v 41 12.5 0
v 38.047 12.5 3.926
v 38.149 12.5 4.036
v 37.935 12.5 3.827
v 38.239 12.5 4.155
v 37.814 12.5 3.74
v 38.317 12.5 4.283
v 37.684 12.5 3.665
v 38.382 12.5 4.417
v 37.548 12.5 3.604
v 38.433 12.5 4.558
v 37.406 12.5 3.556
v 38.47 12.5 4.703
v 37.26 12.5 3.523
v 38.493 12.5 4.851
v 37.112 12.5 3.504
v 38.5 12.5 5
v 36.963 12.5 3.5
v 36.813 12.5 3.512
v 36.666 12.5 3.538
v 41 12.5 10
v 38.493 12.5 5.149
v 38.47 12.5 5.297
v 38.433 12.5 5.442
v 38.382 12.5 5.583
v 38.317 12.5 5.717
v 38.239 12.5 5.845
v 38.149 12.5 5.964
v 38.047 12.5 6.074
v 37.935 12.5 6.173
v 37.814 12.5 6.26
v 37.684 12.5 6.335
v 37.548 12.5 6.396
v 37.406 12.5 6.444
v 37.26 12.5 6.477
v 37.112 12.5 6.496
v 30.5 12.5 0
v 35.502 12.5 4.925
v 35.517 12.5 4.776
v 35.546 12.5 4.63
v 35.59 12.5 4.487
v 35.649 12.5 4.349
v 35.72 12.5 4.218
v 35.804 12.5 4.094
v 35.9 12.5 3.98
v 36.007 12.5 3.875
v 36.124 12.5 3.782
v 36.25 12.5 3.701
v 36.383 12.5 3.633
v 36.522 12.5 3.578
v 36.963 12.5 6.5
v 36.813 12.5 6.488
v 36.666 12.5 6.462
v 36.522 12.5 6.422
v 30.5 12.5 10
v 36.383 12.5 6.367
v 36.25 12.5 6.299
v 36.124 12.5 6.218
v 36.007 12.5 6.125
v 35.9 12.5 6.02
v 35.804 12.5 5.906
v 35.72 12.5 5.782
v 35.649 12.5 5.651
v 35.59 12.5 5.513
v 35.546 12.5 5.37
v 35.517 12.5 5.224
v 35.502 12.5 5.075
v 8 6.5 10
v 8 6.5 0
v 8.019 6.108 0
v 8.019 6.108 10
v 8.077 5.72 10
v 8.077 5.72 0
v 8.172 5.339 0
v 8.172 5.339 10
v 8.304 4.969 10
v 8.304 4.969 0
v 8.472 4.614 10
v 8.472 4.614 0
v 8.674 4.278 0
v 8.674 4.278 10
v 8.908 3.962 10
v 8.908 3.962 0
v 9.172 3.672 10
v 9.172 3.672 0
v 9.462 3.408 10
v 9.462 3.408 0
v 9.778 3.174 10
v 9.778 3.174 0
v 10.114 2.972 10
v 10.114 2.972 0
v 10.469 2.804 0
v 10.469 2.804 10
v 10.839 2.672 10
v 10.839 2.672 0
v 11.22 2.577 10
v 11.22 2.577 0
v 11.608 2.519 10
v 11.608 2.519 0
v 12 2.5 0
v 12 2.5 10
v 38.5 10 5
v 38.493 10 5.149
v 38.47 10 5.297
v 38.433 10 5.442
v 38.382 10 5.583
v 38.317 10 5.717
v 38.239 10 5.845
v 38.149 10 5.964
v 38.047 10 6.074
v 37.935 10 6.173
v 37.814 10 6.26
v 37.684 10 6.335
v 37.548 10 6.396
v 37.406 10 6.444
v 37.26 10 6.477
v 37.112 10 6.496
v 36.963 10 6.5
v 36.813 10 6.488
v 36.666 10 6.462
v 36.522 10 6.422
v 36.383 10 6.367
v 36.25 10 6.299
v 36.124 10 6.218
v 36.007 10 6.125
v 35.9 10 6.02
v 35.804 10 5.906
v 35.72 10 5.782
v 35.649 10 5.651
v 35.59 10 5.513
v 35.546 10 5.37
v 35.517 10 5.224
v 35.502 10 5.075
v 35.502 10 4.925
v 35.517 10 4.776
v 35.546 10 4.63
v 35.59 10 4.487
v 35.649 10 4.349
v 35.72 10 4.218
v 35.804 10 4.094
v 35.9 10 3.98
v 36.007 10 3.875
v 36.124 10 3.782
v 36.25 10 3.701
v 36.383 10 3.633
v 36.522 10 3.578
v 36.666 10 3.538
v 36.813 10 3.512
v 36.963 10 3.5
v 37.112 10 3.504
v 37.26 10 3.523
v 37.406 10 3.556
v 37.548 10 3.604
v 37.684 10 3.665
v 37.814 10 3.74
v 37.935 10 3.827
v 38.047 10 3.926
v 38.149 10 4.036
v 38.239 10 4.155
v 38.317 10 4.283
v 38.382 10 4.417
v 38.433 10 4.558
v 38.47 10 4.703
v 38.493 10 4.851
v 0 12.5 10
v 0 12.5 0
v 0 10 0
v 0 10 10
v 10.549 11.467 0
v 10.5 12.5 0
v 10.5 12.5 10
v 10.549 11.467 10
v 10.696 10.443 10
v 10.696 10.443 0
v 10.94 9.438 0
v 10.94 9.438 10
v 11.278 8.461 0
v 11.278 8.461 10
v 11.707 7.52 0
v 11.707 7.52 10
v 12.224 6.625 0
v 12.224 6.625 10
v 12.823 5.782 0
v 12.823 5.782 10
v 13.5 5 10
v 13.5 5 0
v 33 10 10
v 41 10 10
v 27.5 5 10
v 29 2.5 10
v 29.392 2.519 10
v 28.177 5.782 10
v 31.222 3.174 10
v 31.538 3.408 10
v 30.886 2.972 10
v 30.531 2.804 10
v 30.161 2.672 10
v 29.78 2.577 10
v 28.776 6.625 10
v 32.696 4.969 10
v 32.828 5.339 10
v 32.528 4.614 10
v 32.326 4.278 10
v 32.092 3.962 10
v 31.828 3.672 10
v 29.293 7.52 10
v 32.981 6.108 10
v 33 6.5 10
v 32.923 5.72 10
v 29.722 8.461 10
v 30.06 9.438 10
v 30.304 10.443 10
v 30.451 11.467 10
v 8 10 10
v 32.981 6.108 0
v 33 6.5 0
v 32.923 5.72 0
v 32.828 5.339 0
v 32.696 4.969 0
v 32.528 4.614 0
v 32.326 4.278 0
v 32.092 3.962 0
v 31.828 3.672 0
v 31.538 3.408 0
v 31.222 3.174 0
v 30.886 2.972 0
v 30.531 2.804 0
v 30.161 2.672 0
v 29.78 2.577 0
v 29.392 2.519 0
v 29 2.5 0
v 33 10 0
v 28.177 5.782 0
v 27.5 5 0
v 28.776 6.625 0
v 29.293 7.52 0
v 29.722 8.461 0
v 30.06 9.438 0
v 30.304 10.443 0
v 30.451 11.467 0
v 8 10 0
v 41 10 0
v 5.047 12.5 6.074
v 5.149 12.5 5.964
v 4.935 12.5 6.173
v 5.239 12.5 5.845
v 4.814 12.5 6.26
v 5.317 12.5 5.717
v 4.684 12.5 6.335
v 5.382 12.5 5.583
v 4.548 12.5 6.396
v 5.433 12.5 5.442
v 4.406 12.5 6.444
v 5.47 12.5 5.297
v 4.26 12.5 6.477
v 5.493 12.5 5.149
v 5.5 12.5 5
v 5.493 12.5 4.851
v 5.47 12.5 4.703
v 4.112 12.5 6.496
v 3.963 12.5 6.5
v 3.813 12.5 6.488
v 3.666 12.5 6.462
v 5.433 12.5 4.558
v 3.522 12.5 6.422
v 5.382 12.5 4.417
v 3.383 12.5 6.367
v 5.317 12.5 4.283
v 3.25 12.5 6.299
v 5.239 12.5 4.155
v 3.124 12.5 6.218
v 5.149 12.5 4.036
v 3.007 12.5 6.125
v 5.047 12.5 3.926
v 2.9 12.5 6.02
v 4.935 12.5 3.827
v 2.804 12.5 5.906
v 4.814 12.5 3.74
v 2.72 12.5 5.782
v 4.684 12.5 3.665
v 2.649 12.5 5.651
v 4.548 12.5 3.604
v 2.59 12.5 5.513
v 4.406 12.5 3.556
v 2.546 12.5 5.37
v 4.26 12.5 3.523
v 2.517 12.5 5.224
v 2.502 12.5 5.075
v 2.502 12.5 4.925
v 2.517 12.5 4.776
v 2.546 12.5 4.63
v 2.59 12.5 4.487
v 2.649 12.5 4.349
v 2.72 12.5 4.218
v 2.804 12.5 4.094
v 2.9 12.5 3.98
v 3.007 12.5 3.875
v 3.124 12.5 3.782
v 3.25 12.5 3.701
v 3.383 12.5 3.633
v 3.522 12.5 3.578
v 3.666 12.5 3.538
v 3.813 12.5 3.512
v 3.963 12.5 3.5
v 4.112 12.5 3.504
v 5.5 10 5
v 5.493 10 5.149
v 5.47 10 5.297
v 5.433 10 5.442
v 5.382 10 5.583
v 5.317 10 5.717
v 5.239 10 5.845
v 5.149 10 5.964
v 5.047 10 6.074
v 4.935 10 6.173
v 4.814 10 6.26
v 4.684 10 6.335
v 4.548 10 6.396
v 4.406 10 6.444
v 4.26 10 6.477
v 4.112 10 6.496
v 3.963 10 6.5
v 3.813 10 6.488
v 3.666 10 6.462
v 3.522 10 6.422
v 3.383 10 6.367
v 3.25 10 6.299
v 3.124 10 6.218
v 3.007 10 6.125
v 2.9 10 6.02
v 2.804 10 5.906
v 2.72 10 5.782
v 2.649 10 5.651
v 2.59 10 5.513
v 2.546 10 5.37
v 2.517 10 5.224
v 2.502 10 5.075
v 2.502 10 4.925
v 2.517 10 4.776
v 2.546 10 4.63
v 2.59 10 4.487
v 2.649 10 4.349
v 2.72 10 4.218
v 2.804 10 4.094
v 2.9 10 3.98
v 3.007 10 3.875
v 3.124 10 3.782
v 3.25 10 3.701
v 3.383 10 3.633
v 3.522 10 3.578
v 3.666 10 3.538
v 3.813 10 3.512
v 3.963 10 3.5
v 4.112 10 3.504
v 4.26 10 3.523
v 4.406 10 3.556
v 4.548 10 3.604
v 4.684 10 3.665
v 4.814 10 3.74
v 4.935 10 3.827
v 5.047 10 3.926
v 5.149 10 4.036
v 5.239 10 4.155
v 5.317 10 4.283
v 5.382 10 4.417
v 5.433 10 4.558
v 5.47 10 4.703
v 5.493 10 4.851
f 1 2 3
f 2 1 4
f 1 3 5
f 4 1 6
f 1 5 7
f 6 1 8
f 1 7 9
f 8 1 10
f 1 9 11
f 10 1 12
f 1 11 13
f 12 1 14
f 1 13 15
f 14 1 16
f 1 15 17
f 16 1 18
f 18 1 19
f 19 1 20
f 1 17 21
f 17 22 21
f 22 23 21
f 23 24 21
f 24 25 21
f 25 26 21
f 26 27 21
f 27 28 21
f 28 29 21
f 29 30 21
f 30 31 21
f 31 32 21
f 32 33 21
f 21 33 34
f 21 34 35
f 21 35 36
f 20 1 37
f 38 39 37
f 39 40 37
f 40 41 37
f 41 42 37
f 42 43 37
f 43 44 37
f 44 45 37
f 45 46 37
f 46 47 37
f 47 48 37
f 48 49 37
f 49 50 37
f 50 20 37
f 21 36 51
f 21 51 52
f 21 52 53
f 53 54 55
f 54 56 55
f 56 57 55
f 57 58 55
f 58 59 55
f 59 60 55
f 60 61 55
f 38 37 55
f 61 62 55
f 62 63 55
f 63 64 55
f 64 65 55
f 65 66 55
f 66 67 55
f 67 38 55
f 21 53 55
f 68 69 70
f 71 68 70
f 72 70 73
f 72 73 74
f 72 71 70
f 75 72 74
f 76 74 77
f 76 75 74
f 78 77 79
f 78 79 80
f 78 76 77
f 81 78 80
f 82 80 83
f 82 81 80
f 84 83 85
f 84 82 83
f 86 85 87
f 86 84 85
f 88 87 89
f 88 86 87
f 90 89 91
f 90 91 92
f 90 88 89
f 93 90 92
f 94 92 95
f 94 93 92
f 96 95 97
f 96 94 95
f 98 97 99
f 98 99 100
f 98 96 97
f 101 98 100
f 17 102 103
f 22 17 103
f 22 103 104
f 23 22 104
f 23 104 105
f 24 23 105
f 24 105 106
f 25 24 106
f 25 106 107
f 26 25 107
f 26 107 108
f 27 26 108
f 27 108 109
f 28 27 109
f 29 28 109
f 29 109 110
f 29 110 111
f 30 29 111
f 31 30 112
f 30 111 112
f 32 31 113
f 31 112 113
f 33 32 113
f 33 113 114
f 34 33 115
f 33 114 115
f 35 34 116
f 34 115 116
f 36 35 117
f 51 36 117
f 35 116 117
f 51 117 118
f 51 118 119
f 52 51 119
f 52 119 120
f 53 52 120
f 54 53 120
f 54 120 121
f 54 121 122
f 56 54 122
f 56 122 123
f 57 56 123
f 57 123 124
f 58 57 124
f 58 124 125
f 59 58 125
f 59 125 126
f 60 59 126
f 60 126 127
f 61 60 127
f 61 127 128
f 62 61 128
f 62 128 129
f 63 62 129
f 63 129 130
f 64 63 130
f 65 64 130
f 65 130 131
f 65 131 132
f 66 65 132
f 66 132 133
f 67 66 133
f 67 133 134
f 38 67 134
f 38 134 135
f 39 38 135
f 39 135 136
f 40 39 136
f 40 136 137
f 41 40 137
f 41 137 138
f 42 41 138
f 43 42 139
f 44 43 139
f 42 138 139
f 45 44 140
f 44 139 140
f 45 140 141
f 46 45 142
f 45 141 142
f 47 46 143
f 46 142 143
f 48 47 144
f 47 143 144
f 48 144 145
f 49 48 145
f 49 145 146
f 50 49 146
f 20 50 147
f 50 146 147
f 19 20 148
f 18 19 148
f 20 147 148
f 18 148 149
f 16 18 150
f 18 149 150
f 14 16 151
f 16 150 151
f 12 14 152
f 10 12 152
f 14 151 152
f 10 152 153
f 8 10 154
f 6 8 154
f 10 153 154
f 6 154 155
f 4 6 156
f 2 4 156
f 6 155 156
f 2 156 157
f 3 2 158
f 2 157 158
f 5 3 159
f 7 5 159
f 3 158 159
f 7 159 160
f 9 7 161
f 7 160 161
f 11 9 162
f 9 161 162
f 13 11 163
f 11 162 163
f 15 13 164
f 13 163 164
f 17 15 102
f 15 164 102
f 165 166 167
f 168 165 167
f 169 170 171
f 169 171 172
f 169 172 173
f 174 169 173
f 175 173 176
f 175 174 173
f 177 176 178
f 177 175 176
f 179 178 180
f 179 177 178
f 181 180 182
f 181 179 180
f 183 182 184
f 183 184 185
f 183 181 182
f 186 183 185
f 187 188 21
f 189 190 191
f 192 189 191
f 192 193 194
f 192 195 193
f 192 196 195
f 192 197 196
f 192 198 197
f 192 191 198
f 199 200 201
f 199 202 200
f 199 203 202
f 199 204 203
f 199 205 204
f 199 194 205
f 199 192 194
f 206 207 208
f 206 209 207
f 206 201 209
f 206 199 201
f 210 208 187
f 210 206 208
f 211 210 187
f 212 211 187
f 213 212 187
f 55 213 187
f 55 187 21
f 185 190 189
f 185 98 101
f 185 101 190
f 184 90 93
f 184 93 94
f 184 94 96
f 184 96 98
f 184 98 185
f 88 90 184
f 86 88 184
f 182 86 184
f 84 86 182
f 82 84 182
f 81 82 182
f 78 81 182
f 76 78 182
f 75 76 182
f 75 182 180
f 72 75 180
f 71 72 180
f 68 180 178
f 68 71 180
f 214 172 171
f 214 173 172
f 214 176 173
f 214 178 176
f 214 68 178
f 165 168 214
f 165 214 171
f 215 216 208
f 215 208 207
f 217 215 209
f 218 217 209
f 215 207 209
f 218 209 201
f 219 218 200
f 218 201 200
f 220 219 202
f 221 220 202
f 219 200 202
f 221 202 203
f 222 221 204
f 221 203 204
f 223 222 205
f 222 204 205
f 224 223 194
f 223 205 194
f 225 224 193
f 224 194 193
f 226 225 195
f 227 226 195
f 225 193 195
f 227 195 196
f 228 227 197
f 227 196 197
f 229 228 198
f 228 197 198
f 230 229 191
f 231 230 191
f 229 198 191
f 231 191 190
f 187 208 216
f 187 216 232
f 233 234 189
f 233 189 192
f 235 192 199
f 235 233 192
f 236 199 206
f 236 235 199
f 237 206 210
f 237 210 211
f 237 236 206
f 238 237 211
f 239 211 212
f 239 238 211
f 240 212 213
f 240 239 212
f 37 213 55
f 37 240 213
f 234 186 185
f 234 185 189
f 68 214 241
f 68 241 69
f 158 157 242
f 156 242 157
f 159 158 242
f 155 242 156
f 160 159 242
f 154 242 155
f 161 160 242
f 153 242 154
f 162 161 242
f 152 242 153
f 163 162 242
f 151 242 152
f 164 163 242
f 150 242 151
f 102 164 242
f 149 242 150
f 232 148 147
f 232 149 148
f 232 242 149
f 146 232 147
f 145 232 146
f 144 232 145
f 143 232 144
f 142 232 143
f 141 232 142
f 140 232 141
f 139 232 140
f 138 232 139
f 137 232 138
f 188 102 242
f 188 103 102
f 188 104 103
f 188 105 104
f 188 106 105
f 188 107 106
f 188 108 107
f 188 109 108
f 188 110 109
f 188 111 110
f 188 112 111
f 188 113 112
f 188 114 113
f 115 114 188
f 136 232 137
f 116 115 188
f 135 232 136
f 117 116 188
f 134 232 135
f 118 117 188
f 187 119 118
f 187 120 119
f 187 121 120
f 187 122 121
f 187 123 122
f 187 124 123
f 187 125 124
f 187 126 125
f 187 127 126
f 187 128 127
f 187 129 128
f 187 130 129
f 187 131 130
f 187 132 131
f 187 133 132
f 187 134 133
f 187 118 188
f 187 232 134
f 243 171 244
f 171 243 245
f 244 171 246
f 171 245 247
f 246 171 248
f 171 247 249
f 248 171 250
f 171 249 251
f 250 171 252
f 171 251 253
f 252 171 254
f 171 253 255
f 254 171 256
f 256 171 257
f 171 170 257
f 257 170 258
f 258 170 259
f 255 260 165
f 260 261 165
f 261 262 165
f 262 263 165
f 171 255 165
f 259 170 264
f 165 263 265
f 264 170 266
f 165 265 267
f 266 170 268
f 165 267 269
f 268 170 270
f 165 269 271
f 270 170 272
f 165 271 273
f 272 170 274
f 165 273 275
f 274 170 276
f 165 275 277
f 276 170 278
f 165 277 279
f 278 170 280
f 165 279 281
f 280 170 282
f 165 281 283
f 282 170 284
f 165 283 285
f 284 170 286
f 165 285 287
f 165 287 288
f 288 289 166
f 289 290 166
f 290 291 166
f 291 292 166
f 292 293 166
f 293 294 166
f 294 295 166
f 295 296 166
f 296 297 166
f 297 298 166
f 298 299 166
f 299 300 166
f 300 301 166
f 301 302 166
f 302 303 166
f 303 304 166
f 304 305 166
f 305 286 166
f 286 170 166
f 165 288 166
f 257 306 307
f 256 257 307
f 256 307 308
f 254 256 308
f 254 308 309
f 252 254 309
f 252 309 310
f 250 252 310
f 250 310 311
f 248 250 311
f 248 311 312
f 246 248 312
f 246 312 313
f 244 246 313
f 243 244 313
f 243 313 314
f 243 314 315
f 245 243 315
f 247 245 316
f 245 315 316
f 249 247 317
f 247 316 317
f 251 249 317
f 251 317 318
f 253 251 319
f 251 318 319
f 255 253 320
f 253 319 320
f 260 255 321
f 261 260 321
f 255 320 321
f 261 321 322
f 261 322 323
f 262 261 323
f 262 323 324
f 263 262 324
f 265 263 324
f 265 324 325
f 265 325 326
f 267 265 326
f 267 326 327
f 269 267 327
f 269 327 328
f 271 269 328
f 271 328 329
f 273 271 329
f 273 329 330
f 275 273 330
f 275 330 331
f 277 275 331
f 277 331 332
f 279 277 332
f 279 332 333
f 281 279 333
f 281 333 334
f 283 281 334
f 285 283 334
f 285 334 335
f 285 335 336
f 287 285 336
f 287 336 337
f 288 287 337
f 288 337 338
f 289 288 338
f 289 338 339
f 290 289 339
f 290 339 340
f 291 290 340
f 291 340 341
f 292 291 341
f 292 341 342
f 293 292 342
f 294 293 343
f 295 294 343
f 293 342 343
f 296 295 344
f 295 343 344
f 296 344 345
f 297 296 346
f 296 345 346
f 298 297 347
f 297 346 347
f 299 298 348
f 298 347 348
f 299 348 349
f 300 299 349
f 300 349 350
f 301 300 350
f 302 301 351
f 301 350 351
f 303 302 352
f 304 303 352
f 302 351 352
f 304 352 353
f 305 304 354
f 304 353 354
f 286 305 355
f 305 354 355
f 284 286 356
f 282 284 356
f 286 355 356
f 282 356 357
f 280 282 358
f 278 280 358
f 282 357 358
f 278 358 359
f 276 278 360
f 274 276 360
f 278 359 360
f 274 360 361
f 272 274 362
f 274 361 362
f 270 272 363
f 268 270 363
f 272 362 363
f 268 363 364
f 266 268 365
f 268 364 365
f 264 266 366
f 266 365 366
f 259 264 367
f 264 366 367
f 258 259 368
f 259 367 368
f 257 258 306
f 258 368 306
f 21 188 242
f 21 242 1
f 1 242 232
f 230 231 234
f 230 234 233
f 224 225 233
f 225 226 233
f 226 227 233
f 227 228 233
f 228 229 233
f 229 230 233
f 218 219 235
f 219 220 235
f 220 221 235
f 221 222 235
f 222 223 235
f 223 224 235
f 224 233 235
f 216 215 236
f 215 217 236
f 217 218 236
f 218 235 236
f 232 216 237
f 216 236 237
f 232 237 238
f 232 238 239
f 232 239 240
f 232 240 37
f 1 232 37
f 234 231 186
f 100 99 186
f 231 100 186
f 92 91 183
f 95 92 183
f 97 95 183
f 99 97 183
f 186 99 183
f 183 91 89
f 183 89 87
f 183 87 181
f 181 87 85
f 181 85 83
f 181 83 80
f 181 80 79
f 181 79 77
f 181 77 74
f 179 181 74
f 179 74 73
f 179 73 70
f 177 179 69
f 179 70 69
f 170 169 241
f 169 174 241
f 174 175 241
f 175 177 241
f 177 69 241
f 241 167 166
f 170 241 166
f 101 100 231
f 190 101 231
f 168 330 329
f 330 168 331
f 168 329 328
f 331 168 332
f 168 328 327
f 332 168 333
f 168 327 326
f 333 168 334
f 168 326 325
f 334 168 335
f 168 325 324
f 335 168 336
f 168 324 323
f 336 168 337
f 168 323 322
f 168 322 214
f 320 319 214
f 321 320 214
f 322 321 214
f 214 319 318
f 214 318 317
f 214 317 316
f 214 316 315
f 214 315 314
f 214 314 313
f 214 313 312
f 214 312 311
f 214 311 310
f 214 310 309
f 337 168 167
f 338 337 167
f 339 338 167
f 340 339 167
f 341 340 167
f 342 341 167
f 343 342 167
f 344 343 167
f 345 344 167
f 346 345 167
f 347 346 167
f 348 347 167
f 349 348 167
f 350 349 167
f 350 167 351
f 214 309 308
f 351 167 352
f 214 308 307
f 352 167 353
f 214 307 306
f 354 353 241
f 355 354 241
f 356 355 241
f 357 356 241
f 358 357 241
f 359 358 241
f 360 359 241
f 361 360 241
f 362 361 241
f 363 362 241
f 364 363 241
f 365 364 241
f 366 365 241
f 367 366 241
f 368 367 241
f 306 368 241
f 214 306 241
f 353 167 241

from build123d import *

# Parameters (mm, degrees)
PAD_DEPTH    = 10
SKETCH001_W  = 2.5
SKETCH001_H  = 10
PAD001_DEPTH = 8
SKETCH002_R  = 1.5
POCKET_DEPTH = 2.501
FILLET_R     = 4


with BuildPart() as part:
    # Sketch → Pad (new body)
    with BuildSketch(Plane.XY):
        with BuildLine():
            ThreePointArc((10.5, 12.5), (11.277816, 8.461126), (13.5, 5))
            Line((13.5, 5), (27.5, 5))
            ThreePointArc((27.5, 5), (29.722184, 8.461126), (30.5, 12.5))
            Line((33, 12.5), (30.5, 12.5))
            Line((33, 2.5), (33, 12.5))
            Line((8, 2.5), (33, 2.5))
            Line((8, 10), (8, 2.5))
            Line((0, 10), (8, 10))
            Line((0, 12.5), (0, 10))
            Line((8, 12.5), (0, 12.5))
            Line((10.5, 12.5), (8, 12.5))
        make_face()
    extrude(amount=PAD_DEPTH)

    # Sketch001 (on Face5 of Pad) → Pad001 (join)
    with BuildSketch(Plane.YZ.offset(33)):
        with Locations((11.25, 5)):
            Rectangle(SKETCH001_W, SKETCH001_H)
    extrude(amount=PAD001_DEPTH)

    # Sketch002 (on Face10 of Pad001) → Pocket (cut, through all)
    with BuildSketch(Plane.XZ.offset(-10)):
        with Locations((4, 5)):
            Circle(SKETCH002_R)
        with Locations((37, 5)):
            Circle(SKETCH002_R)
    extrude(amount=-POCKET_DEPTH, mode=Mode.SUBTRACT)

    # Fillet
    fillet_edges = [part.edges().sort_by_distance(p)[0] for p in [
        (8, 2.5, 5),
        (33, 2.5, 5),
    ]]
    fillet(fillet_edges, radius=FILLET_R)


solid = part.part
